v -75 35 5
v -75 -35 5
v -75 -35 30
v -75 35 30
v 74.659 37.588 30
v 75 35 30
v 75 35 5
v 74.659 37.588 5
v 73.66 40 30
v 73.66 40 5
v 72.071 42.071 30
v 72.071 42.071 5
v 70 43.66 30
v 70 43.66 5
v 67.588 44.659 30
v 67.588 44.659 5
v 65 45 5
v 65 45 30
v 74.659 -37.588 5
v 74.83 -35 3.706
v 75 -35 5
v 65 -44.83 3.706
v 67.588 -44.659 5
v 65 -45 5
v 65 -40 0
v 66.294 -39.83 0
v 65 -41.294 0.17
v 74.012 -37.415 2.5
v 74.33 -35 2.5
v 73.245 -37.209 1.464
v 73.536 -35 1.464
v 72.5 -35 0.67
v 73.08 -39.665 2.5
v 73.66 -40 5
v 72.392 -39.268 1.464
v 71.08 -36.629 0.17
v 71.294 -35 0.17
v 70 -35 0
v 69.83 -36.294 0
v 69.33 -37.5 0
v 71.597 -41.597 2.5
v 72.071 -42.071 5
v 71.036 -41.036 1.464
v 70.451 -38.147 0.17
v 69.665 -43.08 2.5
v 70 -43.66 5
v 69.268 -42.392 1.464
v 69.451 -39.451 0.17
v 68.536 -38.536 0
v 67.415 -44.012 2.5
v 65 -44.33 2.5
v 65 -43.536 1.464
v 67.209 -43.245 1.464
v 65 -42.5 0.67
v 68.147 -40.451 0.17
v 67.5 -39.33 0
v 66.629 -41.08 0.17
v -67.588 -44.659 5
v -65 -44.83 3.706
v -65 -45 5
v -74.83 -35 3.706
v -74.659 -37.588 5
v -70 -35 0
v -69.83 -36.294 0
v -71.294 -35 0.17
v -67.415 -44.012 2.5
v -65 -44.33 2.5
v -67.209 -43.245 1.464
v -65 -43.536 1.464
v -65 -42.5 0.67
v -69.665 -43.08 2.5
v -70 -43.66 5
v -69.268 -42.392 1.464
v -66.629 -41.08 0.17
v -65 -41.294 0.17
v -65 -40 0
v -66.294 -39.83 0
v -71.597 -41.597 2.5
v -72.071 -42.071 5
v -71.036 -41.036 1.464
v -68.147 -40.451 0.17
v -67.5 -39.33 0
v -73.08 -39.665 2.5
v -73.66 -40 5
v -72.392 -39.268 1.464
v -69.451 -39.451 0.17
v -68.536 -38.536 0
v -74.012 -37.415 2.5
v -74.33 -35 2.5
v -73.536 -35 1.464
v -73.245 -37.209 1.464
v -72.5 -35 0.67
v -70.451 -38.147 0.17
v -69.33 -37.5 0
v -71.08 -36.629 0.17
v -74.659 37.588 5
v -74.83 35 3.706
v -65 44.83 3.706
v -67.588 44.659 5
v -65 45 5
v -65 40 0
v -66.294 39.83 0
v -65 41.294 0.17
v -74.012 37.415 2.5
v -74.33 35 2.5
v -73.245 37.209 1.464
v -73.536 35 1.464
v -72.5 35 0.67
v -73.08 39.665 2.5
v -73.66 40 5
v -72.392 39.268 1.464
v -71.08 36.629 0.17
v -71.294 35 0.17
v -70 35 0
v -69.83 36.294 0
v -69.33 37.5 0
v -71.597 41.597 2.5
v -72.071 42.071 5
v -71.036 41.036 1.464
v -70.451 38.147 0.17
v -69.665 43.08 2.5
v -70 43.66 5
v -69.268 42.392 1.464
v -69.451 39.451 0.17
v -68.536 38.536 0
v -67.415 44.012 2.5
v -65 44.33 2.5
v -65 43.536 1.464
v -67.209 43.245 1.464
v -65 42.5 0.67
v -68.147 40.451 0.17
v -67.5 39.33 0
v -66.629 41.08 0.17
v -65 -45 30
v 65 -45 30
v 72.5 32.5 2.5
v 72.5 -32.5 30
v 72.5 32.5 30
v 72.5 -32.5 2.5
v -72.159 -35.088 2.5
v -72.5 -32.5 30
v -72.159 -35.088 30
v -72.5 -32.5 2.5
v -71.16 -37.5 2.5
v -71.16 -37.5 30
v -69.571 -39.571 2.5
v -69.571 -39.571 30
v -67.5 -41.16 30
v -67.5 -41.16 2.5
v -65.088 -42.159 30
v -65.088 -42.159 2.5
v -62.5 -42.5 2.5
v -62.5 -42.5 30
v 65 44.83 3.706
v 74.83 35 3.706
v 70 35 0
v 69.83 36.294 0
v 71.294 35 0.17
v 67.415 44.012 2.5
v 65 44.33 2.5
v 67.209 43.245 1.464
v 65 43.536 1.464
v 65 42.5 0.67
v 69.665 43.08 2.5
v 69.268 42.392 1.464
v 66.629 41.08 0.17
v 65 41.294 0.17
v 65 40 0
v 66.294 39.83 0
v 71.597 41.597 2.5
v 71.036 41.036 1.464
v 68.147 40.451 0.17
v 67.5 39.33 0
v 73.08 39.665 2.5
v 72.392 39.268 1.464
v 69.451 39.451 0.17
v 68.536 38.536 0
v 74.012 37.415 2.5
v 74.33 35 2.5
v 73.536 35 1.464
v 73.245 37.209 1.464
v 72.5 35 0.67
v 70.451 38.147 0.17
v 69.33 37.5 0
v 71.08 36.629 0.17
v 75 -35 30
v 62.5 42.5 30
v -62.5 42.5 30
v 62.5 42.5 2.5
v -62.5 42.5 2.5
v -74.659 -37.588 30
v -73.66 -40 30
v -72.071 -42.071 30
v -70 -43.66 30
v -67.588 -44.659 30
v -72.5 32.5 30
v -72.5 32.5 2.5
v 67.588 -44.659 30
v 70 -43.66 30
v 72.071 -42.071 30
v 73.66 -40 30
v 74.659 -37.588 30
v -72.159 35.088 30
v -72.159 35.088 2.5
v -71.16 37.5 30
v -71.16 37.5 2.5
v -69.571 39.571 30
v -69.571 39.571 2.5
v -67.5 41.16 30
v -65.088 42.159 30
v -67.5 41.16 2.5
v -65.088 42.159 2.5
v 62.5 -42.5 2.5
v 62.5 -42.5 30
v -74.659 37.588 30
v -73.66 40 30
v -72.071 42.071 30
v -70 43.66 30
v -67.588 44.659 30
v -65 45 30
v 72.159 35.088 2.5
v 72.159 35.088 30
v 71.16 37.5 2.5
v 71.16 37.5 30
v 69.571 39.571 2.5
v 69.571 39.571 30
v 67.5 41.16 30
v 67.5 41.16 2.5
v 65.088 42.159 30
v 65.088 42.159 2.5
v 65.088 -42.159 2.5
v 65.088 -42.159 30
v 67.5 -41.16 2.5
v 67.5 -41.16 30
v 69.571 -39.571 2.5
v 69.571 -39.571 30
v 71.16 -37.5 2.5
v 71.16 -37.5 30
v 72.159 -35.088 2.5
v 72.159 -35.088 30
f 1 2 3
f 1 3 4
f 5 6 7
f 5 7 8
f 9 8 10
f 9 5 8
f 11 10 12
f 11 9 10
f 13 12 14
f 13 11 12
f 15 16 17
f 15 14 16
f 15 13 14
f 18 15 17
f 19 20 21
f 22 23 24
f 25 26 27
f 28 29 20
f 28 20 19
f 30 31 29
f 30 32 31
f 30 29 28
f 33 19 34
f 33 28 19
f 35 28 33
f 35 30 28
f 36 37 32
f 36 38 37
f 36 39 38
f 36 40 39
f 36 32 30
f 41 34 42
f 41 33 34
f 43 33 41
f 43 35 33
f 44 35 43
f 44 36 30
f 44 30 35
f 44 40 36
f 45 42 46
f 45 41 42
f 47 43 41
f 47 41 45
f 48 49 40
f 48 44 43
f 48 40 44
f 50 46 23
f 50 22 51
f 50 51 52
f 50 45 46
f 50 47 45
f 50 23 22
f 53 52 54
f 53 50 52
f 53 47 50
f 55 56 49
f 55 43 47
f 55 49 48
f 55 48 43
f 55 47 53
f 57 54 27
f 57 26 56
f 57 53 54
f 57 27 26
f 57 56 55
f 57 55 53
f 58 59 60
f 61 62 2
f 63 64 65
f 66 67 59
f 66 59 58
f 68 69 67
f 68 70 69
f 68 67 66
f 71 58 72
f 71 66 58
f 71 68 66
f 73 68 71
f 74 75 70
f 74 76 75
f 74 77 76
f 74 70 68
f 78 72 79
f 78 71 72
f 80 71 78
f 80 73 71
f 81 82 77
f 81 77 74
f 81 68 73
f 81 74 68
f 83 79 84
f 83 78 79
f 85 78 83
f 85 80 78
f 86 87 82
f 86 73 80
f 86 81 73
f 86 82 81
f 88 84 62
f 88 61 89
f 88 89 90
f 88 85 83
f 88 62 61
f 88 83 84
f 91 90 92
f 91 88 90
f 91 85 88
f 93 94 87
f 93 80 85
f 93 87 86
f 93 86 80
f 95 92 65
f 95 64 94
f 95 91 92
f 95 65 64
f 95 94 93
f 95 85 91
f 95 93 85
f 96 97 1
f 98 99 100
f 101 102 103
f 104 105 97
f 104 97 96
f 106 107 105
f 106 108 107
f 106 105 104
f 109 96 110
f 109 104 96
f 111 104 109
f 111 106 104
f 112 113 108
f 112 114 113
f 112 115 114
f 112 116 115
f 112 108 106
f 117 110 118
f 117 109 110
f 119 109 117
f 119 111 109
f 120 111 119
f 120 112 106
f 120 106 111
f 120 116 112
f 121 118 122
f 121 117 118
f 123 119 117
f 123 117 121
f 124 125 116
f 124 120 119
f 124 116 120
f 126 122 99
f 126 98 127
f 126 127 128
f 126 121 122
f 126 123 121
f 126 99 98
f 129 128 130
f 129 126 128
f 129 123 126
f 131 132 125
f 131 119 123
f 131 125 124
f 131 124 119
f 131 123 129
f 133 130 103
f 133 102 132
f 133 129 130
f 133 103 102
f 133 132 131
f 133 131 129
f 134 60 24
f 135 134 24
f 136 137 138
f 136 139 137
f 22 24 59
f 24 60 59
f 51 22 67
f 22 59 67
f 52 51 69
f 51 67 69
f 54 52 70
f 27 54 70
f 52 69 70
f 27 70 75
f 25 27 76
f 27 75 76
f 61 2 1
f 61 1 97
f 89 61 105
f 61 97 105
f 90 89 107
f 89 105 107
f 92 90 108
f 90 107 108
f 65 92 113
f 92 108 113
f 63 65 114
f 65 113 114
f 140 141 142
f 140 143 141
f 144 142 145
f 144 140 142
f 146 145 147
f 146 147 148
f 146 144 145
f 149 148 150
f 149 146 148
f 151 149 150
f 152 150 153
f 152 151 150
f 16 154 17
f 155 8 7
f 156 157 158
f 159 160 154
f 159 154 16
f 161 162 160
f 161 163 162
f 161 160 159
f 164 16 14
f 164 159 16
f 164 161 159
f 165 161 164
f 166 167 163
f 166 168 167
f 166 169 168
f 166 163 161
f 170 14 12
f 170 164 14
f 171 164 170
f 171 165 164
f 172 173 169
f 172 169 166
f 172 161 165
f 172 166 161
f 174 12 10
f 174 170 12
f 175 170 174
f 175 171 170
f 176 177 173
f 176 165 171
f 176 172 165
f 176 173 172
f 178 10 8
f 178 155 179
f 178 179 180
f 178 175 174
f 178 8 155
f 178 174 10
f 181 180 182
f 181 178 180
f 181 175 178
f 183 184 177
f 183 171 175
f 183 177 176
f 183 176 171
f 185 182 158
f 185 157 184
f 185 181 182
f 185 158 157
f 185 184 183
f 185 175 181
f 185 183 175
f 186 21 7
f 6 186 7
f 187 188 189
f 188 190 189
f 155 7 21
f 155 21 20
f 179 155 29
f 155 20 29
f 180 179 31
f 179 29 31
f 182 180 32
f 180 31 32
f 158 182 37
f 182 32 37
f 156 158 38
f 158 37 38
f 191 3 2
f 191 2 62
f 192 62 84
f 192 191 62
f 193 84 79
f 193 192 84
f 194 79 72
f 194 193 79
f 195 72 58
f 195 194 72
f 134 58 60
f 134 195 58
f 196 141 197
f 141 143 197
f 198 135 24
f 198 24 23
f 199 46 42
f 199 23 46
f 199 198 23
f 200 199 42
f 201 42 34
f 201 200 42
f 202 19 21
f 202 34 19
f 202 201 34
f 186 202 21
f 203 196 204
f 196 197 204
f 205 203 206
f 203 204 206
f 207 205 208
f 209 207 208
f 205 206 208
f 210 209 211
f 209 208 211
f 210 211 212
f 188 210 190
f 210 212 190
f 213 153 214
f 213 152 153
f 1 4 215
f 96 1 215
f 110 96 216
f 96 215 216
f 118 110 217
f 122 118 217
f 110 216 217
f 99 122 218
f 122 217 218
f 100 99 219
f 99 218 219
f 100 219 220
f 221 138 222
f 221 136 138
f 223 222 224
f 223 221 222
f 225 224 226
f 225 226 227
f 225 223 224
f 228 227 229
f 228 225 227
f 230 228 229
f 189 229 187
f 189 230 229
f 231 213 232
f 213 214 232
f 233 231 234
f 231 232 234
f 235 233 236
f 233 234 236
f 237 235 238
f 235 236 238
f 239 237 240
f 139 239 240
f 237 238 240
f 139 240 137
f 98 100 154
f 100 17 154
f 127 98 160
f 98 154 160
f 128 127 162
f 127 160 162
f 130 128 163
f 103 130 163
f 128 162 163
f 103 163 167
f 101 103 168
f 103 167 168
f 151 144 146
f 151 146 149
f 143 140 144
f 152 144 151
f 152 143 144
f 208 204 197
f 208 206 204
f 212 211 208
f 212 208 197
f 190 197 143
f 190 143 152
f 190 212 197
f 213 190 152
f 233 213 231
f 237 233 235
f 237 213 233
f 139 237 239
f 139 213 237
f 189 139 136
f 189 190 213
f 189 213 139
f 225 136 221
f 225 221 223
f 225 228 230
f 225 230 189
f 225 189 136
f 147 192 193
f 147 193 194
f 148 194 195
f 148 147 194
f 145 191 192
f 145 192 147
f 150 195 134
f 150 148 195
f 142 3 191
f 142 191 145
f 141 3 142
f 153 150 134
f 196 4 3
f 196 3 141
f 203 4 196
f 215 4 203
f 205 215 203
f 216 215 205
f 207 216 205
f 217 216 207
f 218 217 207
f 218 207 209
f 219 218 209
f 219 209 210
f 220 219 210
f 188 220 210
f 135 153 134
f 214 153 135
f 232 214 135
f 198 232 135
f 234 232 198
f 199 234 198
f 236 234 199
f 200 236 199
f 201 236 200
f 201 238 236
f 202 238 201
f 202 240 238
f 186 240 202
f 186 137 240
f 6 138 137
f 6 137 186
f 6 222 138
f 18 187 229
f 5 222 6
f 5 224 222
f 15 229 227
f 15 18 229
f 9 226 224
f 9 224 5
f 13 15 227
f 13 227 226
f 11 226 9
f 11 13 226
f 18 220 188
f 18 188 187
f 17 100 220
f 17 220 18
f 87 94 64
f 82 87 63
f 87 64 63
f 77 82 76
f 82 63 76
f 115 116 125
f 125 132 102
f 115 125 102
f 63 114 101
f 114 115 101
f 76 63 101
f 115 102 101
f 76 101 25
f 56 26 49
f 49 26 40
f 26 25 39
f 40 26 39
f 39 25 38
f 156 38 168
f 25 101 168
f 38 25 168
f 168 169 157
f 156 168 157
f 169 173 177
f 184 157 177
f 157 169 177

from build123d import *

# Parameters (mm, degrees)
F0_W     = 150
F0_H     = 90
F1_DEPTH = 30
F2_T     = -2.5
F3_R     = 10
F4_R     = 5


with BuildPart() as f1:
    # F0 (on Top) → F1 (new body)
    with BuildSketch(Plane.XY):
        Rectangle(F0_W, F0_H)
    extrude(amount=F1_DEPTH)

    # F2
    f2_openings = [f1.faces().sort_by_distance(p)[0] for p in [
        (0, 0, 30),
    ]]
    offset(amount=F2_T, openings=f2_openings)

    # F3
    f3_edges = [f1.edges().sort_by_distance(p)[0] for p in [
        (-75, 45, 15),
        (75, 45, 15),
        (75, -45, 15),
        (-75, -45, 15),
        (-72.5, 42.5, 16.25),
        (72.5, 42.5, 16.25),
        (72.5, -42.5, 16.25),
        (-72.5, -42.5, 16.25),
    ]]
    fillet(f3_edges, radius=F3_R)

    # F4
    f4_edges = [f1.edges().sort_by_distance(p)[0] for p in [
        (-75, 0, 0),
        (-72.071068, -42.071068, 0),
        (0, -45, 0),
        (72.071068, -42.071068, 0),
        (75, 0, 0),
        (72.071068, 42.071068, 0),
        (0, 45, 0),
        (-72.071068, 42.071068, 0),
    ]]
    fillet(f4_edges, radius=F4_R)


solid = f1.part
